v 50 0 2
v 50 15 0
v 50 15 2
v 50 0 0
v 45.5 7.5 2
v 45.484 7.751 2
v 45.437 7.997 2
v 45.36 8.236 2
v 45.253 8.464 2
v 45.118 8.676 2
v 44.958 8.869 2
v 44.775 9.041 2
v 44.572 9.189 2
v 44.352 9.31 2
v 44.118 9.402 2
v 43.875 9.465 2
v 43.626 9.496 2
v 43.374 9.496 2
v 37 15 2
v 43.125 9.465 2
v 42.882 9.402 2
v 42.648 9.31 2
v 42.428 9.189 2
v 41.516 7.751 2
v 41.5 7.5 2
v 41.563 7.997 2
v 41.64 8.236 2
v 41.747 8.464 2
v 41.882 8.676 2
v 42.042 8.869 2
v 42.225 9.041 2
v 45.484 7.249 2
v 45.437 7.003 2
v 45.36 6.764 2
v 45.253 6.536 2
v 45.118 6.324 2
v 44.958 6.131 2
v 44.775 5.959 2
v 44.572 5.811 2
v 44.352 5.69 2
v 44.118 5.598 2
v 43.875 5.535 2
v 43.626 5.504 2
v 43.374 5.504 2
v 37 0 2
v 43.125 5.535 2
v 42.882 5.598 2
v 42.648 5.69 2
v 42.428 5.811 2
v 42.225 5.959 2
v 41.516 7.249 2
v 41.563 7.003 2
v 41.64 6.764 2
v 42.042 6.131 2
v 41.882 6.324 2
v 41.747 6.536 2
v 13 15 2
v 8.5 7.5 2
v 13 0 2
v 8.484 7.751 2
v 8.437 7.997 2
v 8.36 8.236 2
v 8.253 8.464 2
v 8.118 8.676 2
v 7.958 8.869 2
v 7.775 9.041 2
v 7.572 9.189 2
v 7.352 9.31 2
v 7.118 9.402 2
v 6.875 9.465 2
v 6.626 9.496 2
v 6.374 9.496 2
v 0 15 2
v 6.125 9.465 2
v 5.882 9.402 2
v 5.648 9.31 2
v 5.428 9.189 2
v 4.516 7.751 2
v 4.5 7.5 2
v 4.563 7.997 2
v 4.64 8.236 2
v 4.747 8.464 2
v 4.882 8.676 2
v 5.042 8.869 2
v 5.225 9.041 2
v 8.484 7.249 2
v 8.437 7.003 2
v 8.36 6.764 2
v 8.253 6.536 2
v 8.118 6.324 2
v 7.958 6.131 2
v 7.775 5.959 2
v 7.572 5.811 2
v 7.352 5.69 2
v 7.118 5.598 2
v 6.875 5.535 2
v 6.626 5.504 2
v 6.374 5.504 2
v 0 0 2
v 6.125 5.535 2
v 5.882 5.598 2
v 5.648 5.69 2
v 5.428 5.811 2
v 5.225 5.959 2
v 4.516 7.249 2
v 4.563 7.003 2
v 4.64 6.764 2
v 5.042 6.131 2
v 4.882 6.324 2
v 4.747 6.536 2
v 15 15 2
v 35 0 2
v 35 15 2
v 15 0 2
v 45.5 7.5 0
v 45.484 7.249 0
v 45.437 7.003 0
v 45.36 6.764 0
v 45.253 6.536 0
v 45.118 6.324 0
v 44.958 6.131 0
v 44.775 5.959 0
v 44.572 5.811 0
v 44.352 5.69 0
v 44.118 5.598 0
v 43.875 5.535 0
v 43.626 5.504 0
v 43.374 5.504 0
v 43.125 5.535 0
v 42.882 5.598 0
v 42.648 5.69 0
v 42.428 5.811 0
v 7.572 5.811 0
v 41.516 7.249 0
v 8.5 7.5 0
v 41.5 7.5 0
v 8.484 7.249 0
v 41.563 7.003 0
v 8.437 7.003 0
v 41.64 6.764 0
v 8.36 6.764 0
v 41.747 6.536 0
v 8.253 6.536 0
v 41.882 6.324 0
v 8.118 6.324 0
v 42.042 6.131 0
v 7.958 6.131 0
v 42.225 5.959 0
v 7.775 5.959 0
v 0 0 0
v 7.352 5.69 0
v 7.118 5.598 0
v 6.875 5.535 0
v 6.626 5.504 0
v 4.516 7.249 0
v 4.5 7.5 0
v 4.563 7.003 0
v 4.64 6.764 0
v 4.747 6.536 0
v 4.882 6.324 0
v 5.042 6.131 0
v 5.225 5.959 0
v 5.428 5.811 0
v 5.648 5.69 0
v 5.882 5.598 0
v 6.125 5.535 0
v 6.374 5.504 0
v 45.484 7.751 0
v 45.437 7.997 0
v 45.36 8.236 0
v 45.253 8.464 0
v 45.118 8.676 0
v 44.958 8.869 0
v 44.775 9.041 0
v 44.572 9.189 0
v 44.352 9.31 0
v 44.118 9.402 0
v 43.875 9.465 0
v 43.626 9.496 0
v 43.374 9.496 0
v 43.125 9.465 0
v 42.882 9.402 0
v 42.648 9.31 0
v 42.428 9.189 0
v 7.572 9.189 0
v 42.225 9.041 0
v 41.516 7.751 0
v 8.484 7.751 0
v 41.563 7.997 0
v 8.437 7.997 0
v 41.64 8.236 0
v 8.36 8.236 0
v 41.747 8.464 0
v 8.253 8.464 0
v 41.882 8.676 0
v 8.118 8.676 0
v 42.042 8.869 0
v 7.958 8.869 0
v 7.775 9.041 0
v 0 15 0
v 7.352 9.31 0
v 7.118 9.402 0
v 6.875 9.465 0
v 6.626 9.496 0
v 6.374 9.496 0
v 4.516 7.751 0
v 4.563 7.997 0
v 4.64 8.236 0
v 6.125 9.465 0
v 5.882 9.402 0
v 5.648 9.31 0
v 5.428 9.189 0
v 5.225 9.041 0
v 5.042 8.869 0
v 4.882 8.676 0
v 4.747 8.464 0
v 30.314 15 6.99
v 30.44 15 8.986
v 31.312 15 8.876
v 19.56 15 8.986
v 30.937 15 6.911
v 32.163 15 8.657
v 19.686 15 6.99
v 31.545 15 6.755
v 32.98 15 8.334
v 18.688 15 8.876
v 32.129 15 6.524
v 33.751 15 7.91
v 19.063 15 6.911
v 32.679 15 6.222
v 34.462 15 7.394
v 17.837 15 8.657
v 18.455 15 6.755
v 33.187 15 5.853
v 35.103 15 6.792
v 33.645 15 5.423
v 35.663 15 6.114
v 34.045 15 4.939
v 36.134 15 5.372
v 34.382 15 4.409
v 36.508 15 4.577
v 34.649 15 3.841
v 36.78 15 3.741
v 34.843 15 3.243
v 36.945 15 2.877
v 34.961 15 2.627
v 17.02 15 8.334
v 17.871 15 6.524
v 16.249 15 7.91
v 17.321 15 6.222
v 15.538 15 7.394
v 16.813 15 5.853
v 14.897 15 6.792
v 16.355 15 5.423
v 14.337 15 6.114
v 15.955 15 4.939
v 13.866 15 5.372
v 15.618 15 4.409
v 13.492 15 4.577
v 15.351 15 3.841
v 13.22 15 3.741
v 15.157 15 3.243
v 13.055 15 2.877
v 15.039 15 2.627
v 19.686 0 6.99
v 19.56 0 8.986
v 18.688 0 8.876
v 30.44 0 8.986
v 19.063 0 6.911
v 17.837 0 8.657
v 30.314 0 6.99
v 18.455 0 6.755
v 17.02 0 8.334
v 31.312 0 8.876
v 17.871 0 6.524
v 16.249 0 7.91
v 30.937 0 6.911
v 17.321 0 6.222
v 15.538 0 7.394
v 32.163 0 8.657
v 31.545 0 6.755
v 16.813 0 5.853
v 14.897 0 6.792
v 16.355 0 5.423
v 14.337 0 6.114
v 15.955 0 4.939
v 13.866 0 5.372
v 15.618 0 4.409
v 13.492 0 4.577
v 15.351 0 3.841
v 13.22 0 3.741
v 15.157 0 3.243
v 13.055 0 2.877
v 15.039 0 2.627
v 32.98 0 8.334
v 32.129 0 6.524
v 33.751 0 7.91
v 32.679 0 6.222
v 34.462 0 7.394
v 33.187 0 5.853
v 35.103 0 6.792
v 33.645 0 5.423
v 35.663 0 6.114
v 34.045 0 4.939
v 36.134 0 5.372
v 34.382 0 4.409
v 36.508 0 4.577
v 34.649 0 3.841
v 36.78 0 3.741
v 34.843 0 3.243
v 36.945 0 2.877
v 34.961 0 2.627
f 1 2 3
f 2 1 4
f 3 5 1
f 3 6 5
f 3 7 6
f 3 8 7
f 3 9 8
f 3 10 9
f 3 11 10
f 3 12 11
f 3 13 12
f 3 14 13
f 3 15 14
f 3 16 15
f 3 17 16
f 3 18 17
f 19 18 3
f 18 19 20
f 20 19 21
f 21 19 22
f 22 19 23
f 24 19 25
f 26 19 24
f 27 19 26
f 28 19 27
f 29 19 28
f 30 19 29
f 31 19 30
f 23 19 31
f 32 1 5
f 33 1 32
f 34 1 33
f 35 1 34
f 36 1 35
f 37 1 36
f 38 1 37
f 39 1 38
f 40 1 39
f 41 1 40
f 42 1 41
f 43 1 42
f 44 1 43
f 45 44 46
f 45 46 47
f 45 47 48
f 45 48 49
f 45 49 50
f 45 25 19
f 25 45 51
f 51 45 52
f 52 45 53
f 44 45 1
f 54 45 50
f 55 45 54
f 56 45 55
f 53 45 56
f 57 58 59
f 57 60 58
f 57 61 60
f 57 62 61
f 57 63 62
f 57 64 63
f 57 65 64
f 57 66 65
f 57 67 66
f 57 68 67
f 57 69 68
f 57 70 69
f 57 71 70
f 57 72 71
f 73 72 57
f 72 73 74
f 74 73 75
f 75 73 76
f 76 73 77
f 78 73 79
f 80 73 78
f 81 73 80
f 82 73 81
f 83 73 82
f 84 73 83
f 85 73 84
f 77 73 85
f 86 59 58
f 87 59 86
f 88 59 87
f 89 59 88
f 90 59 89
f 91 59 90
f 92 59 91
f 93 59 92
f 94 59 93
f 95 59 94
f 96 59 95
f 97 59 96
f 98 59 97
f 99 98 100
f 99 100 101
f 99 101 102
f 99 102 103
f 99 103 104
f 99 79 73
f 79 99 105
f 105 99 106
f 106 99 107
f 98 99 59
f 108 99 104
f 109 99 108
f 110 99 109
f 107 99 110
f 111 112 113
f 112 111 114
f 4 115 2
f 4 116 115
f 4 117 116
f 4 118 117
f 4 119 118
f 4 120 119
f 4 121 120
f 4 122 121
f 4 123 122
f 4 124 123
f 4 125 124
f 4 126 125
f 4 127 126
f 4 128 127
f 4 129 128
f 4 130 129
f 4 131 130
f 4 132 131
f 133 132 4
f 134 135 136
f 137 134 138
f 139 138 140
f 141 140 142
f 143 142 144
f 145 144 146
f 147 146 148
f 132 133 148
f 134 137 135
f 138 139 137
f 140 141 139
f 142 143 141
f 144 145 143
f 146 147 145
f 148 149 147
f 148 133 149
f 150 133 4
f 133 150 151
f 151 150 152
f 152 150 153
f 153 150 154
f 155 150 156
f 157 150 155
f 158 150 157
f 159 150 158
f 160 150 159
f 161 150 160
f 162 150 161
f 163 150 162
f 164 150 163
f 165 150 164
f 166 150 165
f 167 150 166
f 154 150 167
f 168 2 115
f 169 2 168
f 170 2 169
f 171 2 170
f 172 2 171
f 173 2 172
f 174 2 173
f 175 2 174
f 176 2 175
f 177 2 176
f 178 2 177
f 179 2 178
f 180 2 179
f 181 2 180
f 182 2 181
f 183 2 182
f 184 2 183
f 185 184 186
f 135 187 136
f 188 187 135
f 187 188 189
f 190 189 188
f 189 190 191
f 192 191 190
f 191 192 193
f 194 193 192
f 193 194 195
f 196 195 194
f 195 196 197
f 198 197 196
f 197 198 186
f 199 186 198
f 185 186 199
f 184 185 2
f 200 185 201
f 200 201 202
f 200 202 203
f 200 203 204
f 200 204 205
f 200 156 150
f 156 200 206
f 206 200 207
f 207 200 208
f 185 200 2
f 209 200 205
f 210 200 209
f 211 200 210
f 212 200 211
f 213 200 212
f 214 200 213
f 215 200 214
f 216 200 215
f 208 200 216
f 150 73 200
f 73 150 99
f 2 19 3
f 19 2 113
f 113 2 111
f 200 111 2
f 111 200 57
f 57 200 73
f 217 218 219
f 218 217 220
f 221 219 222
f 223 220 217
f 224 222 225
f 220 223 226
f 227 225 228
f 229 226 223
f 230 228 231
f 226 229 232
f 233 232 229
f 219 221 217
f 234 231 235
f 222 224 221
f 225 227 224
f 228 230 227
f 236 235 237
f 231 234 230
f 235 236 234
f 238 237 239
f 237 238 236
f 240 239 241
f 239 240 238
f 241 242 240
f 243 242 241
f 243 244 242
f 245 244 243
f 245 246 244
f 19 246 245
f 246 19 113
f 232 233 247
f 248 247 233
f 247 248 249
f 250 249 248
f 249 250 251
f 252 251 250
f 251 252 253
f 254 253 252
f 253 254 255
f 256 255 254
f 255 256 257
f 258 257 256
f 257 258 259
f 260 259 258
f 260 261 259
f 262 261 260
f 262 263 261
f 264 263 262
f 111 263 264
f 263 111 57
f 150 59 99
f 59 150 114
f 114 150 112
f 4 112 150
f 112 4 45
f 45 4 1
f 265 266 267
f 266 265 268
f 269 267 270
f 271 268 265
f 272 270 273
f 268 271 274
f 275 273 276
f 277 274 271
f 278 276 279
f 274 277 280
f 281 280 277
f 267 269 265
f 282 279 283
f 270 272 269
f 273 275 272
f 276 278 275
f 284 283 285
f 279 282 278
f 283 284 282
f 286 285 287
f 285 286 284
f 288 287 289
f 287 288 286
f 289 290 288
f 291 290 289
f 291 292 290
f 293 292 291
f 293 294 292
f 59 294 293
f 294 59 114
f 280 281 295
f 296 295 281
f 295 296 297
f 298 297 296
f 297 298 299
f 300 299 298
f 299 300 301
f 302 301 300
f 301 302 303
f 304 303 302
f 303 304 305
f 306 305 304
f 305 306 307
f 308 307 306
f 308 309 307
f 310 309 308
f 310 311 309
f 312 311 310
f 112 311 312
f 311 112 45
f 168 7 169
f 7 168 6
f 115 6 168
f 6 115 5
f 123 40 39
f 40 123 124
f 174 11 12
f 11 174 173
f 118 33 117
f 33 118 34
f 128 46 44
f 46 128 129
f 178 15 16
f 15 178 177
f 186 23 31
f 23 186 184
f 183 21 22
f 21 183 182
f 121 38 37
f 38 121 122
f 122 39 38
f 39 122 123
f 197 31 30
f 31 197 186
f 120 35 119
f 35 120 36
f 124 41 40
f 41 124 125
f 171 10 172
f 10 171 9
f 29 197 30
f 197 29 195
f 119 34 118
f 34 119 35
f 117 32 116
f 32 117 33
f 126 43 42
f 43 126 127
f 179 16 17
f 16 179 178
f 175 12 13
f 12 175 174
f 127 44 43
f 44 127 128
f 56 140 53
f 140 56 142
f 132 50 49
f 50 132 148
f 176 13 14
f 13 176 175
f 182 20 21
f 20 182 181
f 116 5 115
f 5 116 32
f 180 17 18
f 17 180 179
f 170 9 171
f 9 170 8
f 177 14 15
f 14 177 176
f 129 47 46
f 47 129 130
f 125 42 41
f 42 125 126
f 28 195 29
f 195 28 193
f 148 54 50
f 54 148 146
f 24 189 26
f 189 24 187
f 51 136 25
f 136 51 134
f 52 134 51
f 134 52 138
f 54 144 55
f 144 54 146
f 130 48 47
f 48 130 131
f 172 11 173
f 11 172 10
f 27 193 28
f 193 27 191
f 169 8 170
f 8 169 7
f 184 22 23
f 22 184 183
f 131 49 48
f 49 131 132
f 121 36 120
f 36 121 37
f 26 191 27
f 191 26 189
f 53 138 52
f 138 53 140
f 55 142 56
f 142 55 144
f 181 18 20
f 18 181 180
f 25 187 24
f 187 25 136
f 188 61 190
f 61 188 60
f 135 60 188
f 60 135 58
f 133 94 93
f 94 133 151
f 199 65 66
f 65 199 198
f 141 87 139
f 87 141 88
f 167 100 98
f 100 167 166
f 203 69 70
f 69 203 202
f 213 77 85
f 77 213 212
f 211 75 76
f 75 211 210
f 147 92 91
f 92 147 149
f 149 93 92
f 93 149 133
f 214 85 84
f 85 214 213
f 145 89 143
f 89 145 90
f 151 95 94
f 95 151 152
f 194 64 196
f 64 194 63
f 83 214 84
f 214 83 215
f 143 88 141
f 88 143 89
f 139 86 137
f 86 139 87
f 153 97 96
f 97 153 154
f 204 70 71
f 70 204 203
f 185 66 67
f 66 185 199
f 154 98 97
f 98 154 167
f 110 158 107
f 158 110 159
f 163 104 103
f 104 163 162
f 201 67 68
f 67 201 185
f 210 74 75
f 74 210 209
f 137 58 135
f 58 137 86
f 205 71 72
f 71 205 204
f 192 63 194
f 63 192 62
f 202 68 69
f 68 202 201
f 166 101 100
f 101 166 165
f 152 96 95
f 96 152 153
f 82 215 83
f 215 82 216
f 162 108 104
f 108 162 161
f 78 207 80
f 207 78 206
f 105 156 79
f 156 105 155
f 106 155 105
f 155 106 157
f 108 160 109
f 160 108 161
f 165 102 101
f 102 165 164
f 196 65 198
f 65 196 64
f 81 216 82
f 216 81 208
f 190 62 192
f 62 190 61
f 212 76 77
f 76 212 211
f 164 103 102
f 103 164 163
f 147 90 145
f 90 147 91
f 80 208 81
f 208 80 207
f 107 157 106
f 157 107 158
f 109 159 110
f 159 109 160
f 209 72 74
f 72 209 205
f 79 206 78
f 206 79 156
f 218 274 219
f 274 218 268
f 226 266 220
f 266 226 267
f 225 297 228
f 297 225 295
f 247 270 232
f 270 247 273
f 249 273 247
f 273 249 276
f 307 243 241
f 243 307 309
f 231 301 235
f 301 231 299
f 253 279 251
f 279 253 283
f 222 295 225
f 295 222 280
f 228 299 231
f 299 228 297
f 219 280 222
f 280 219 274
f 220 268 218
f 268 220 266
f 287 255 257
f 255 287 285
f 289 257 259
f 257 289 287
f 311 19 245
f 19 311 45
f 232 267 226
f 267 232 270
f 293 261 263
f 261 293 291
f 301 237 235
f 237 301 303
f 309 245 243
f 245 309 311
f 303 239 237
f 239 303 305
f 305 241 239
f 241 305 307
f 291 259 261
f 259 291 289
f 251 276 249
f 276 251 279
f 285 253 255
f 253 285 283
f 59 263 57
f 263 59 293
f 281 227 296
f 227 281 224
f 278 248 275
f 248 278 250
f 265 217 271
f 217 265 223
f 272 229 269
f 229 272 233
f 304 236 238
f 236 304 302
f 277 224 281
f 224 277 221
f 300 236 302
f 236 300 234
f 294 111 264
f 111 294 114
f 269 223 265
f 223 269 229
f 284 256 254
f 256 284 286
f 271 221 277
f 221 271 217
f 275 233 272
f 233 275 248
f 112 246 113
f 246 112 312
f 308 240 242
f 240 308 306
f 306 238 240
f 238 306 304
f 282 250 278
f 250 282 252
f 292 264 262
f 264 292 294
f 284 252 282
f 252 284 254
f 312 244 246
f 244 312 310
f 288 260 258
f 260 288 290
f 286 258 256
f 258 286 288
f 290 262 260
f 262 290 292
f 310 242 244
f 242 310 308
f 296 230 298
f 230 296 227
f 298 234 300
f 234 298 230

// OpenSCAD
$fn = 50;

/* Ceiling Loop Mount */

/* [Enable/Disable Loops] */
loop_pos = "c"; // [c:center,l:left,r:right, a:all, s:side only]

/* [Mounting Strip Base]  */
/* Command Strip dimentions is typically 50mmx15mm */
sx = 50 ; // length of mounting strip base
sy = 15 ; // width of mounting strip base
sh = 2  ; // height of mounting strip base

/* [Loop Sizing] */
lt = 2; // loop thickness
lh = 5; // loop size
ll = 10; // loop length

/* [Wood Screw Option] */
sd = 4; // Screw Hole Dia
so = 6.5; // Screw Offset

/* Hook function and module */
function loop_width(thickness, holesize) = holesize+thickness*2;
module hook(x, z, thickness, holesize)
{
    /* Hook centre */
    translate([x, 0  , z])
    difference()
    {
        outerdia = (holesize*2+thickness*2);
        hull()
        {
            translate([-ll/2, 0, 0])
                rotate([-90,0,0])
                    cylinder(r=outerdia/2, h=sy);
            translate([ll/2, 0, 0])
                rotate([-90,0,0])
                    cylinder(r=outerdia/2, h=sy);
        }
        hull()
        {
            translate([-ll/2, -0.5, 0])
                rotate([-90,,0])
                cylinder(r=holesize, h=sy+1);
            translate([ll/2, -0.5, 0])
                rotate([-90,,0])
                cylinder(r=holesize, h=sy+1);
        }
        translate([-(ll+holesize), -1/2  , -outerdia/2])
            cube([(ll+holesize)*2,sy+1,outerdia/2]);
    }
}

union() {
    difference()
    {
        translate([0  , 0  , 0])
            cube([sx,sy,sh]);
        translate([sx-so,sy/2,-0.5])
            cylinder(d=sd, h=sh+1);
        translate([so,sy/2,-0.5])
            cylinder(d=sd, h=sh+1);
    }
   
    if ((loop_pos == "a")||(loop_pos == "c"))
        hook(sx/2, sh, lt, lh);
    if ((loop_pos == "a")||(loop_pos == "s")||(loop_pos == "l"))
        hook(loop_width(lt, lh)/2, sh, lt, lh);
    if ((loop_pos == "a")||(loop_pos == "s")||(loop_pos == "r") )
        hook(sx-loop_width(lt, lh)/2, sh, lt, lh);
} 
